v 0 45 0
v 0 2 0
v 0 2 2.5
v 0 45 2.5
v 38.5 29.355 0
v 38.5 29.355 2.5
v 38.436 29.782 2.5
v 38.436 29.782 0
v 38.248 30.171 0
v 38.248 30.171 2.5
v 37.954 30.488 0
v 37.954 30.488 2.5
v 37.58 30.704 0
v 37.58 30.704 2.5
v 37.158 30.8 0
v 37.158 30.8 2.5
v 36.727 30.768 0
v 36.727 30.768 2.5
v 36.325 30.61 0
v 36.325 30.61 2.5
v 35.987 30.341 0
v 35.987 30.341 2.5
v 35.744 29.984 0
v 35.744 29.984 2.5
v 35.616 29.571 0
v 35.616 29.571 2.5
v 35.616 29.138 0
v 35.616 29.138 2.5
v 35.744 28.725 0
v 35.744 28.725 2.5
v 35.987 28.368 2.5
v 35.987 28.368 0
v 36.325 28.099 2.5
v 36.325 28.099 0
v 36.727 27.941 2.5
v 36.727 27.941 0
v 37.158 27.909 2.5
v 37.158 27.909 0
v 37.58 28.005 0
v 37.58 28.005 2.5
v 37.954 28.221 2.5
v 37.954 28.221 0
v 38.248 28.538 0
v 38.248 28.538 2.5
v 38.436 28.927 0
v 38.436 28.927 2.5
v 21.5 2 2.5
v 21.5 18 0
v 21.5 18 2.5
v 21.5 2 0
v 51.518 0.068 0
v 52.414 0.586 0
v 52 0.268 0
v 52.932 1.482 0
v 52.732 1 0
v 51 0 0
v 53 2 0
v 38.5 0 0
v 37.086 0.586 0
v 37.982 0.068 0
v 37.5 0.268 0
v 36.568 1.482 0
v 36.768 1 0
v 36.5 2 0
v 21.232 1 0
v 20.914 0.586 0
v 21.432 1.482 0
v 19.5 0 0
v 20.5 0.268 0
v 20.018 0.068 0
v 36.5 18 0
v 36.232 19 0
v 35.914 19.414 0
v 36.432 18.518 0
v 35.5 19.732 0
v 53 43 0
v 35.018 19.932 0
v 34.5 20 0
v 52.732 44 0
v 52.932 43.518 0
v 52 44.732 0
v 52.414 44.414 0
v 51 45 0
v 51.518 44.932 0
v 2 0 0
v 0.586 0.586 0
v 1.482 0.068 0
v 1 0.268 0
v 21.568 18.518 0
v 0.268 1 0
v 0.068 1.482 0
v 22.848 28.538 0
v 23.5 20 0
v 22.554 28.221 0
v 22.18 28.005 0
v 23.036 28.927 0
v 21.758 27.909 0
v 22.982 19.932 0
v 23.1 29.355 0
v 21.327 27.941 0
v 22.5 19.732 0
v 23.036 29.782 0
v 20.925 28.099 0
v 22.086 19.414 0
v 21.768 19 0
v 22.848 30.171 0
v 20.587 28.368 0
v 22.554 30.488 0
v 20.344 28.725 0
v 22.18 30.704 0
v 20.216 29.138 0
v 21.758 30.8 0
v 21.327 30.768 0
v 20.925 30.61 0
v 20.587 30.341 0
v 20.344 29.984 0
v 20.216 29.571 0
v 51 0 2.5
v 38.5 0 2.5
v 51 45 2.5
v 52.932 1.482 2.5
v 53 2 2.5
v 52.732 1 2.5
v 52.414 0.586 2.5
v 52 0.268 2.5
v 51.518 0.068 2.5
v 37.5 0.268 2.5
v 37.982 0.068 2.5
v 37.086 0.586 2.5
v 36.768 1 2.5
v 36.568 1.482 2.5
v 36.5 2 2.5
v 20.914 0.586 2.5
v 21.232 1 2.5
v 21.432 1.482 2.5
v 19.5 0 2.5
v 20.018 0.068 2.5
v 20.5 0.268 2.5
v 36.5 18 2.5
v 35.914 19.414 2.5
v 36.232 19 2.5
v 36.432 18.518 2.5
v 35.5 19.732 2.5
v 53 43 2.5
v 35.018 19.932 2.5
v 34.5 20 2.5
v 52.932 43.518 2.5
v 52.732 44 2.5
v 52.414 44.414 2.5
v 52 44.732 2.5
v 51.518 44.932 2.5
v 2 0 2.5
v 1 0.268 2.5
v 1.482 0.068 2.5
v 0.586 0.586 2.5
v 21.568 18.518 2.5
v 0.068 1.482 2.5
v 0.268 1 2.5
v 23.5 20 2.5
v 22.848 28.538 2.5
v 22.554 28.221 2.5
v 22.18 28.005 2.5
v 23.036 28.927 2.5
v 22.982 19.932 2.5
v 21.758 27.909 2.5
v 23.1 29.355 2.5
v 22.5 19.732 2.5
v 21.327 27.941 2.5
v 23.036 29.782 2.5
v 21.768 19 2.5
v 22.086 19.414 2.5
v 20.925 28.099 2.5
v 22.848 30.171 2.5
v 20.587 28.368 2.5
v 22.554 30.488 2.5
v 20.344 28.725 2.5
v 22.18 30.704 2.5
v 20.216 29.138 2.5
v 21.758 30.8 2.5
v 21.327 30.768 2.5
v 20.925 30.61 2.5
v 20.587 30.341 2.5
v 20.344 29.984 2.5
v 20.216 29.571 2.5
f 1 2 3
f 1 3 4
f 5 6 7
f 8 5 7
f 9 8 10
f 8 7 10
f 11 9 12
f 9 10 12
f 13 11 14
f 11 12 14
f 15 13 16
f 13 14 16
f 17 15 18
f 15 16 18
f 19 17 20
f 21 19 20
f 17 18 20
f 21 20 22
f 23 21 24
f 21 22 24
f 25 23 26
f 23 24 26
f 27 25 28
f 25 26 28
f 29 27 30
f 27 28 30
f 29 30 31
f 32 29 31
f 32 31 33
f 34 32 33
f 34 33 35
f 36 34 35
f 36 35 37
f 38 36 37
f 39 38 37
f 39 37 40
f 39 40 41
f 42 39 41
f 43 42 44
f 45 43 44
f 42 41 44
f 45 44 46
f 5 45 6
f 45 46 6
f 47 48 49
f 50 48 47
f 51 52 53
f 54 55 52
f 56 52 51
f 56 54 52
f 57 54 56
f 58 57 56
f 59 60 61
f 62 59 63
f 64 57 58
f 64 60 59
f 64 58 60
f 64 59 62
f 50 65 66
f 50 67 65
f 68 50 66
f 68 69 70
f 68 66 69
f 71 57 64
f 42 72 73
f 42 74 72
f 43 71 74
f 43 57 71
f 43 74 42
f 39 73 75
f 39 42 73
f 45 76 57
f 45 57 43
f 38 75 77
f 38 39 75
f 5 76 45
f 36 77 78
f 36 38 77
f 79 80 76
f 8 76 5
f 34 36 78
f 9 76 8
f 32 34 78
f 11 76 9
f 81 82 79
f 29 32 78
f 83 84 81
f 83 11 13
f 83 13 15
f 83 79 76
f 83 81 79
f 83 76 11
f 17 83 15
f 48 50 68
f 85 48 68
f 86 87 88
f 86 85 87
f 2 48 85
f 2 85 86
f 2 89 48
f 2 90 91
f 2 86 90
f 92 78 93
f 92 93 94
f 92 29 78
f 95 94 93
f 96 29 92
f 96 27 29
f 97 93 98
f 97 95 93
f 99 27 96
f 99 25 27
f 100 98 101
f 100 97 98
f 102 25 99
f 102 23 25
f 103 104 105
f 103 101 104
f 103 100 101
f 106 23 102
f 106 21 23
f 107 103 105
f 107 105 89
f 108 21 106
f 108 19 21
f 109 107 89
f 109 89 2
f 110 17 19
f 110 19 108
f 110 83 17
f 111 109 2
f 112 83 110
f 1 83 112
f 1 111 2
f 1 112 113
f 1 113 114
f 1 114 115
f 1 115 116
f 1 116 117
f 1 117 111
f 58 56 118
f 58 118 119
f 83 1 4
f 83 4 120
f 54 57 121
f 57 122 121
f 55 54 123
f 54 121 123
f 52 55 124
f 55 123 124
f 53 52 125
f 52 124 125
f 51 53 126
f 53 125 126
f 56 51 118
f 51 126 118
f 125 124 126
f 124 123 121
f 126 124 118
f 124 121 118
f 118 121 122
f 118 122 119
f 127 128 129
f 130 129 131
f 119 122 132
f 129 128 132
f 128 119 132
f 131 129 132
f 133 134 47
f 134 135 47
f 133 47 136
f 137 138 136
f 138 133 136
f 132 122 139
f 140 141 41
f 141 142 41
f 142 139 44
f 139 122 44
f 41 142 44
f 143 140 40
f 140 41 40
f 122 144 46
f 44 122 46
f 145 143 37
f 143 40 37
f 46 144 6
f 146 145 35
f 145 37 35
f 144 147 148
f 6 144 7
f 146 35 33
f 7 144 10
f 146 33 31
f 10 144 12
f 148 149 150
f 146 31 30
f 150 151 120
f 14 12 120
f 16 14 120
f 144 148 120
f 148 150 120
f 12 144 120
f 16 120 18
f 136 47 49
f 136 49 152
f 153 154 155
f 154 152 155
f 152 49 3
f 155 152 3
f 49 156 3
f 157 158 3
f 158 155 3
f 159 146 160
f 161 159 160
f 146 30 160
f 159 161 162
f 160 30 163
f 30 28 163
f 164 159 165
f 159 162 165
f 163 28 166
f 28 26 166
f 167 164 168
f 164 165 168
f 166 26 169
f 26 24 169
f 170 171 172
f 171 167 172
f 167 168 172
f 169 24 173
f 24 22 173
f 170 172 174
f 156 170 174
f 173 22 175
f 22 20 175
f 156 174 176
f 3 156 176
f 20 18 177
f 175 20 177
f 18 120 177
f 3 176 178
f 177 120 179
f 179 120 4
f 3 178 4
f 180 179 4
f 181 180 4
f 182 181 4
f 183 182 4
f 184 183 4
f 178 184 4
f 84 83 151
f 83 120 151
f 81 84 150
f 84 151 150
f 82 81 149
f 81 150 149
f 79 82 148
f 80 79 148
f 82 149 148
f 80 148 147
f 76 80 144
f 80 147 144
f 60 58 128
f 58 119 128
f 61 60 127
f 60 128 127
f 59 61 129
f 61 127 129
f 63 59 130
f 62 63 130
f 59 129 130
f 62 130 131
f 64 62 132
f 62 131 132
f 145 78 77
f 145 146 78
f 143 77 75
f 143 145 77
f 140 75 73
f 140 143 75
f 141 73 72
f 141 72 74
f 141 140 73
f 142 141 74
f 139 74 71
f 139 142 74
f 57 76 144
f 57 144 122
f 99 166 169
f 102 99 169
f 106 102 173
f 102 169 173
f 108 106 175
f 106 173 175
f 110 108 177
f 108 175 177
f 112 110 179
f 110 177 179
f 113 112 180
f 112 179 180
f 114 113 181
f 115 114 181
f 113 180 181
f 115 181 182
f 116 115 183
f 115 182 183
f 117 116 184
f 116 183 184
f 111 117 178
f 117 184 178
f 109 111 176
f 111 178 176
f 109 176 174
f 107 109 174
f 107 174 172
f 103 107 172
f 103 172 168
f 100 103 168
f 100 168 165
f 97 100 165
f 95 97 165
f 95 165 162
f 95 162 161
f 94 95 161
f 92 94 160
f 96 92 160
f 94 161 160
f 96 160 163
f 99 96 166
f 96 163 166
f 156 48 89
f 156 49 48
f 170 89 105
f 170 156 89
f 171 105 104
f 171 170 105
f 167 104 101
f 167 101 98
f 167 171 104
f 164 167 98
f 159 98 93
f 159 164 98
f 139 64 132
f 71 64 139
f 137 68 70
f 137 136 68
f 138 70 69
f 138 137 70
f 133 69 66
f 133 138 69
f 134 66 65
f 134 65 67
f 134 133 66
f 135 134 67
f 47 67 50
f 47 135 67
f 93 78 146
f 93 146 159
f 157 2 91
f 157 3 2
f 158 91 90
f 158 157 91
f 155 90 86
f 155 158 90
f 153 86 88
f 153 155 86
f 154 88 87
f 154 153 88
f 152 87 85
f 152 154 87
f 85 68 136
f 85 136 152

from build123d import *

# Parameters (mm, degrees)
SALIENTE_EXTRUIR1_DEPTH = 2.5
CROQUIS2_R              = 1.45
CORTAR_EXTRUIR1_DEPTH   = 2.5
REDONDEO1_R             = 2


with BuildPart() as part:
    # Croquis1 → Saliente-Extruir1 (new body)
    with BuildSketch(Plane.XY):
        Polygon((0, 0), (0, 45), (53, 45), (53, 0), (36.5, 0), (36.5, 20), (21.5, 20), (21.5, 0), align=None)
    extrude(amount=SALIENTE_EXTRUIR1_DEPTH)

    # Croquis2 → Cortar-Extruir1 (cut)
    with BuildSketch(Plane.XY.offset(2.5)):
        with Locations((37.05, 29.354509915)):
            Circle(CROQUIS2_R)
        with Locations((21.65, 29.354509915)):
            Circle(CROQUIS2_R)
    extrude(amount=-CORTAR_EXTRUIR1_DEPTH, mode=Mode.SUBTRACT)

    # Redondeo1
    redondeo1_edges = [part.edges().sort_by_distance(p)[0] for p in [
        (0, 0, 1.25),
        (53, 45, 1.25),
        (53, 0, 1.25),
        (36.5, 0, 1.25),
        (36.5, 20, 1.25),
        (21.5, 20, 1.25),
        (21.5, 0, 1.25),
    ]]
    fillet(redondeo1_edges, radius=REDONDEO1_R)


solid = part.part
